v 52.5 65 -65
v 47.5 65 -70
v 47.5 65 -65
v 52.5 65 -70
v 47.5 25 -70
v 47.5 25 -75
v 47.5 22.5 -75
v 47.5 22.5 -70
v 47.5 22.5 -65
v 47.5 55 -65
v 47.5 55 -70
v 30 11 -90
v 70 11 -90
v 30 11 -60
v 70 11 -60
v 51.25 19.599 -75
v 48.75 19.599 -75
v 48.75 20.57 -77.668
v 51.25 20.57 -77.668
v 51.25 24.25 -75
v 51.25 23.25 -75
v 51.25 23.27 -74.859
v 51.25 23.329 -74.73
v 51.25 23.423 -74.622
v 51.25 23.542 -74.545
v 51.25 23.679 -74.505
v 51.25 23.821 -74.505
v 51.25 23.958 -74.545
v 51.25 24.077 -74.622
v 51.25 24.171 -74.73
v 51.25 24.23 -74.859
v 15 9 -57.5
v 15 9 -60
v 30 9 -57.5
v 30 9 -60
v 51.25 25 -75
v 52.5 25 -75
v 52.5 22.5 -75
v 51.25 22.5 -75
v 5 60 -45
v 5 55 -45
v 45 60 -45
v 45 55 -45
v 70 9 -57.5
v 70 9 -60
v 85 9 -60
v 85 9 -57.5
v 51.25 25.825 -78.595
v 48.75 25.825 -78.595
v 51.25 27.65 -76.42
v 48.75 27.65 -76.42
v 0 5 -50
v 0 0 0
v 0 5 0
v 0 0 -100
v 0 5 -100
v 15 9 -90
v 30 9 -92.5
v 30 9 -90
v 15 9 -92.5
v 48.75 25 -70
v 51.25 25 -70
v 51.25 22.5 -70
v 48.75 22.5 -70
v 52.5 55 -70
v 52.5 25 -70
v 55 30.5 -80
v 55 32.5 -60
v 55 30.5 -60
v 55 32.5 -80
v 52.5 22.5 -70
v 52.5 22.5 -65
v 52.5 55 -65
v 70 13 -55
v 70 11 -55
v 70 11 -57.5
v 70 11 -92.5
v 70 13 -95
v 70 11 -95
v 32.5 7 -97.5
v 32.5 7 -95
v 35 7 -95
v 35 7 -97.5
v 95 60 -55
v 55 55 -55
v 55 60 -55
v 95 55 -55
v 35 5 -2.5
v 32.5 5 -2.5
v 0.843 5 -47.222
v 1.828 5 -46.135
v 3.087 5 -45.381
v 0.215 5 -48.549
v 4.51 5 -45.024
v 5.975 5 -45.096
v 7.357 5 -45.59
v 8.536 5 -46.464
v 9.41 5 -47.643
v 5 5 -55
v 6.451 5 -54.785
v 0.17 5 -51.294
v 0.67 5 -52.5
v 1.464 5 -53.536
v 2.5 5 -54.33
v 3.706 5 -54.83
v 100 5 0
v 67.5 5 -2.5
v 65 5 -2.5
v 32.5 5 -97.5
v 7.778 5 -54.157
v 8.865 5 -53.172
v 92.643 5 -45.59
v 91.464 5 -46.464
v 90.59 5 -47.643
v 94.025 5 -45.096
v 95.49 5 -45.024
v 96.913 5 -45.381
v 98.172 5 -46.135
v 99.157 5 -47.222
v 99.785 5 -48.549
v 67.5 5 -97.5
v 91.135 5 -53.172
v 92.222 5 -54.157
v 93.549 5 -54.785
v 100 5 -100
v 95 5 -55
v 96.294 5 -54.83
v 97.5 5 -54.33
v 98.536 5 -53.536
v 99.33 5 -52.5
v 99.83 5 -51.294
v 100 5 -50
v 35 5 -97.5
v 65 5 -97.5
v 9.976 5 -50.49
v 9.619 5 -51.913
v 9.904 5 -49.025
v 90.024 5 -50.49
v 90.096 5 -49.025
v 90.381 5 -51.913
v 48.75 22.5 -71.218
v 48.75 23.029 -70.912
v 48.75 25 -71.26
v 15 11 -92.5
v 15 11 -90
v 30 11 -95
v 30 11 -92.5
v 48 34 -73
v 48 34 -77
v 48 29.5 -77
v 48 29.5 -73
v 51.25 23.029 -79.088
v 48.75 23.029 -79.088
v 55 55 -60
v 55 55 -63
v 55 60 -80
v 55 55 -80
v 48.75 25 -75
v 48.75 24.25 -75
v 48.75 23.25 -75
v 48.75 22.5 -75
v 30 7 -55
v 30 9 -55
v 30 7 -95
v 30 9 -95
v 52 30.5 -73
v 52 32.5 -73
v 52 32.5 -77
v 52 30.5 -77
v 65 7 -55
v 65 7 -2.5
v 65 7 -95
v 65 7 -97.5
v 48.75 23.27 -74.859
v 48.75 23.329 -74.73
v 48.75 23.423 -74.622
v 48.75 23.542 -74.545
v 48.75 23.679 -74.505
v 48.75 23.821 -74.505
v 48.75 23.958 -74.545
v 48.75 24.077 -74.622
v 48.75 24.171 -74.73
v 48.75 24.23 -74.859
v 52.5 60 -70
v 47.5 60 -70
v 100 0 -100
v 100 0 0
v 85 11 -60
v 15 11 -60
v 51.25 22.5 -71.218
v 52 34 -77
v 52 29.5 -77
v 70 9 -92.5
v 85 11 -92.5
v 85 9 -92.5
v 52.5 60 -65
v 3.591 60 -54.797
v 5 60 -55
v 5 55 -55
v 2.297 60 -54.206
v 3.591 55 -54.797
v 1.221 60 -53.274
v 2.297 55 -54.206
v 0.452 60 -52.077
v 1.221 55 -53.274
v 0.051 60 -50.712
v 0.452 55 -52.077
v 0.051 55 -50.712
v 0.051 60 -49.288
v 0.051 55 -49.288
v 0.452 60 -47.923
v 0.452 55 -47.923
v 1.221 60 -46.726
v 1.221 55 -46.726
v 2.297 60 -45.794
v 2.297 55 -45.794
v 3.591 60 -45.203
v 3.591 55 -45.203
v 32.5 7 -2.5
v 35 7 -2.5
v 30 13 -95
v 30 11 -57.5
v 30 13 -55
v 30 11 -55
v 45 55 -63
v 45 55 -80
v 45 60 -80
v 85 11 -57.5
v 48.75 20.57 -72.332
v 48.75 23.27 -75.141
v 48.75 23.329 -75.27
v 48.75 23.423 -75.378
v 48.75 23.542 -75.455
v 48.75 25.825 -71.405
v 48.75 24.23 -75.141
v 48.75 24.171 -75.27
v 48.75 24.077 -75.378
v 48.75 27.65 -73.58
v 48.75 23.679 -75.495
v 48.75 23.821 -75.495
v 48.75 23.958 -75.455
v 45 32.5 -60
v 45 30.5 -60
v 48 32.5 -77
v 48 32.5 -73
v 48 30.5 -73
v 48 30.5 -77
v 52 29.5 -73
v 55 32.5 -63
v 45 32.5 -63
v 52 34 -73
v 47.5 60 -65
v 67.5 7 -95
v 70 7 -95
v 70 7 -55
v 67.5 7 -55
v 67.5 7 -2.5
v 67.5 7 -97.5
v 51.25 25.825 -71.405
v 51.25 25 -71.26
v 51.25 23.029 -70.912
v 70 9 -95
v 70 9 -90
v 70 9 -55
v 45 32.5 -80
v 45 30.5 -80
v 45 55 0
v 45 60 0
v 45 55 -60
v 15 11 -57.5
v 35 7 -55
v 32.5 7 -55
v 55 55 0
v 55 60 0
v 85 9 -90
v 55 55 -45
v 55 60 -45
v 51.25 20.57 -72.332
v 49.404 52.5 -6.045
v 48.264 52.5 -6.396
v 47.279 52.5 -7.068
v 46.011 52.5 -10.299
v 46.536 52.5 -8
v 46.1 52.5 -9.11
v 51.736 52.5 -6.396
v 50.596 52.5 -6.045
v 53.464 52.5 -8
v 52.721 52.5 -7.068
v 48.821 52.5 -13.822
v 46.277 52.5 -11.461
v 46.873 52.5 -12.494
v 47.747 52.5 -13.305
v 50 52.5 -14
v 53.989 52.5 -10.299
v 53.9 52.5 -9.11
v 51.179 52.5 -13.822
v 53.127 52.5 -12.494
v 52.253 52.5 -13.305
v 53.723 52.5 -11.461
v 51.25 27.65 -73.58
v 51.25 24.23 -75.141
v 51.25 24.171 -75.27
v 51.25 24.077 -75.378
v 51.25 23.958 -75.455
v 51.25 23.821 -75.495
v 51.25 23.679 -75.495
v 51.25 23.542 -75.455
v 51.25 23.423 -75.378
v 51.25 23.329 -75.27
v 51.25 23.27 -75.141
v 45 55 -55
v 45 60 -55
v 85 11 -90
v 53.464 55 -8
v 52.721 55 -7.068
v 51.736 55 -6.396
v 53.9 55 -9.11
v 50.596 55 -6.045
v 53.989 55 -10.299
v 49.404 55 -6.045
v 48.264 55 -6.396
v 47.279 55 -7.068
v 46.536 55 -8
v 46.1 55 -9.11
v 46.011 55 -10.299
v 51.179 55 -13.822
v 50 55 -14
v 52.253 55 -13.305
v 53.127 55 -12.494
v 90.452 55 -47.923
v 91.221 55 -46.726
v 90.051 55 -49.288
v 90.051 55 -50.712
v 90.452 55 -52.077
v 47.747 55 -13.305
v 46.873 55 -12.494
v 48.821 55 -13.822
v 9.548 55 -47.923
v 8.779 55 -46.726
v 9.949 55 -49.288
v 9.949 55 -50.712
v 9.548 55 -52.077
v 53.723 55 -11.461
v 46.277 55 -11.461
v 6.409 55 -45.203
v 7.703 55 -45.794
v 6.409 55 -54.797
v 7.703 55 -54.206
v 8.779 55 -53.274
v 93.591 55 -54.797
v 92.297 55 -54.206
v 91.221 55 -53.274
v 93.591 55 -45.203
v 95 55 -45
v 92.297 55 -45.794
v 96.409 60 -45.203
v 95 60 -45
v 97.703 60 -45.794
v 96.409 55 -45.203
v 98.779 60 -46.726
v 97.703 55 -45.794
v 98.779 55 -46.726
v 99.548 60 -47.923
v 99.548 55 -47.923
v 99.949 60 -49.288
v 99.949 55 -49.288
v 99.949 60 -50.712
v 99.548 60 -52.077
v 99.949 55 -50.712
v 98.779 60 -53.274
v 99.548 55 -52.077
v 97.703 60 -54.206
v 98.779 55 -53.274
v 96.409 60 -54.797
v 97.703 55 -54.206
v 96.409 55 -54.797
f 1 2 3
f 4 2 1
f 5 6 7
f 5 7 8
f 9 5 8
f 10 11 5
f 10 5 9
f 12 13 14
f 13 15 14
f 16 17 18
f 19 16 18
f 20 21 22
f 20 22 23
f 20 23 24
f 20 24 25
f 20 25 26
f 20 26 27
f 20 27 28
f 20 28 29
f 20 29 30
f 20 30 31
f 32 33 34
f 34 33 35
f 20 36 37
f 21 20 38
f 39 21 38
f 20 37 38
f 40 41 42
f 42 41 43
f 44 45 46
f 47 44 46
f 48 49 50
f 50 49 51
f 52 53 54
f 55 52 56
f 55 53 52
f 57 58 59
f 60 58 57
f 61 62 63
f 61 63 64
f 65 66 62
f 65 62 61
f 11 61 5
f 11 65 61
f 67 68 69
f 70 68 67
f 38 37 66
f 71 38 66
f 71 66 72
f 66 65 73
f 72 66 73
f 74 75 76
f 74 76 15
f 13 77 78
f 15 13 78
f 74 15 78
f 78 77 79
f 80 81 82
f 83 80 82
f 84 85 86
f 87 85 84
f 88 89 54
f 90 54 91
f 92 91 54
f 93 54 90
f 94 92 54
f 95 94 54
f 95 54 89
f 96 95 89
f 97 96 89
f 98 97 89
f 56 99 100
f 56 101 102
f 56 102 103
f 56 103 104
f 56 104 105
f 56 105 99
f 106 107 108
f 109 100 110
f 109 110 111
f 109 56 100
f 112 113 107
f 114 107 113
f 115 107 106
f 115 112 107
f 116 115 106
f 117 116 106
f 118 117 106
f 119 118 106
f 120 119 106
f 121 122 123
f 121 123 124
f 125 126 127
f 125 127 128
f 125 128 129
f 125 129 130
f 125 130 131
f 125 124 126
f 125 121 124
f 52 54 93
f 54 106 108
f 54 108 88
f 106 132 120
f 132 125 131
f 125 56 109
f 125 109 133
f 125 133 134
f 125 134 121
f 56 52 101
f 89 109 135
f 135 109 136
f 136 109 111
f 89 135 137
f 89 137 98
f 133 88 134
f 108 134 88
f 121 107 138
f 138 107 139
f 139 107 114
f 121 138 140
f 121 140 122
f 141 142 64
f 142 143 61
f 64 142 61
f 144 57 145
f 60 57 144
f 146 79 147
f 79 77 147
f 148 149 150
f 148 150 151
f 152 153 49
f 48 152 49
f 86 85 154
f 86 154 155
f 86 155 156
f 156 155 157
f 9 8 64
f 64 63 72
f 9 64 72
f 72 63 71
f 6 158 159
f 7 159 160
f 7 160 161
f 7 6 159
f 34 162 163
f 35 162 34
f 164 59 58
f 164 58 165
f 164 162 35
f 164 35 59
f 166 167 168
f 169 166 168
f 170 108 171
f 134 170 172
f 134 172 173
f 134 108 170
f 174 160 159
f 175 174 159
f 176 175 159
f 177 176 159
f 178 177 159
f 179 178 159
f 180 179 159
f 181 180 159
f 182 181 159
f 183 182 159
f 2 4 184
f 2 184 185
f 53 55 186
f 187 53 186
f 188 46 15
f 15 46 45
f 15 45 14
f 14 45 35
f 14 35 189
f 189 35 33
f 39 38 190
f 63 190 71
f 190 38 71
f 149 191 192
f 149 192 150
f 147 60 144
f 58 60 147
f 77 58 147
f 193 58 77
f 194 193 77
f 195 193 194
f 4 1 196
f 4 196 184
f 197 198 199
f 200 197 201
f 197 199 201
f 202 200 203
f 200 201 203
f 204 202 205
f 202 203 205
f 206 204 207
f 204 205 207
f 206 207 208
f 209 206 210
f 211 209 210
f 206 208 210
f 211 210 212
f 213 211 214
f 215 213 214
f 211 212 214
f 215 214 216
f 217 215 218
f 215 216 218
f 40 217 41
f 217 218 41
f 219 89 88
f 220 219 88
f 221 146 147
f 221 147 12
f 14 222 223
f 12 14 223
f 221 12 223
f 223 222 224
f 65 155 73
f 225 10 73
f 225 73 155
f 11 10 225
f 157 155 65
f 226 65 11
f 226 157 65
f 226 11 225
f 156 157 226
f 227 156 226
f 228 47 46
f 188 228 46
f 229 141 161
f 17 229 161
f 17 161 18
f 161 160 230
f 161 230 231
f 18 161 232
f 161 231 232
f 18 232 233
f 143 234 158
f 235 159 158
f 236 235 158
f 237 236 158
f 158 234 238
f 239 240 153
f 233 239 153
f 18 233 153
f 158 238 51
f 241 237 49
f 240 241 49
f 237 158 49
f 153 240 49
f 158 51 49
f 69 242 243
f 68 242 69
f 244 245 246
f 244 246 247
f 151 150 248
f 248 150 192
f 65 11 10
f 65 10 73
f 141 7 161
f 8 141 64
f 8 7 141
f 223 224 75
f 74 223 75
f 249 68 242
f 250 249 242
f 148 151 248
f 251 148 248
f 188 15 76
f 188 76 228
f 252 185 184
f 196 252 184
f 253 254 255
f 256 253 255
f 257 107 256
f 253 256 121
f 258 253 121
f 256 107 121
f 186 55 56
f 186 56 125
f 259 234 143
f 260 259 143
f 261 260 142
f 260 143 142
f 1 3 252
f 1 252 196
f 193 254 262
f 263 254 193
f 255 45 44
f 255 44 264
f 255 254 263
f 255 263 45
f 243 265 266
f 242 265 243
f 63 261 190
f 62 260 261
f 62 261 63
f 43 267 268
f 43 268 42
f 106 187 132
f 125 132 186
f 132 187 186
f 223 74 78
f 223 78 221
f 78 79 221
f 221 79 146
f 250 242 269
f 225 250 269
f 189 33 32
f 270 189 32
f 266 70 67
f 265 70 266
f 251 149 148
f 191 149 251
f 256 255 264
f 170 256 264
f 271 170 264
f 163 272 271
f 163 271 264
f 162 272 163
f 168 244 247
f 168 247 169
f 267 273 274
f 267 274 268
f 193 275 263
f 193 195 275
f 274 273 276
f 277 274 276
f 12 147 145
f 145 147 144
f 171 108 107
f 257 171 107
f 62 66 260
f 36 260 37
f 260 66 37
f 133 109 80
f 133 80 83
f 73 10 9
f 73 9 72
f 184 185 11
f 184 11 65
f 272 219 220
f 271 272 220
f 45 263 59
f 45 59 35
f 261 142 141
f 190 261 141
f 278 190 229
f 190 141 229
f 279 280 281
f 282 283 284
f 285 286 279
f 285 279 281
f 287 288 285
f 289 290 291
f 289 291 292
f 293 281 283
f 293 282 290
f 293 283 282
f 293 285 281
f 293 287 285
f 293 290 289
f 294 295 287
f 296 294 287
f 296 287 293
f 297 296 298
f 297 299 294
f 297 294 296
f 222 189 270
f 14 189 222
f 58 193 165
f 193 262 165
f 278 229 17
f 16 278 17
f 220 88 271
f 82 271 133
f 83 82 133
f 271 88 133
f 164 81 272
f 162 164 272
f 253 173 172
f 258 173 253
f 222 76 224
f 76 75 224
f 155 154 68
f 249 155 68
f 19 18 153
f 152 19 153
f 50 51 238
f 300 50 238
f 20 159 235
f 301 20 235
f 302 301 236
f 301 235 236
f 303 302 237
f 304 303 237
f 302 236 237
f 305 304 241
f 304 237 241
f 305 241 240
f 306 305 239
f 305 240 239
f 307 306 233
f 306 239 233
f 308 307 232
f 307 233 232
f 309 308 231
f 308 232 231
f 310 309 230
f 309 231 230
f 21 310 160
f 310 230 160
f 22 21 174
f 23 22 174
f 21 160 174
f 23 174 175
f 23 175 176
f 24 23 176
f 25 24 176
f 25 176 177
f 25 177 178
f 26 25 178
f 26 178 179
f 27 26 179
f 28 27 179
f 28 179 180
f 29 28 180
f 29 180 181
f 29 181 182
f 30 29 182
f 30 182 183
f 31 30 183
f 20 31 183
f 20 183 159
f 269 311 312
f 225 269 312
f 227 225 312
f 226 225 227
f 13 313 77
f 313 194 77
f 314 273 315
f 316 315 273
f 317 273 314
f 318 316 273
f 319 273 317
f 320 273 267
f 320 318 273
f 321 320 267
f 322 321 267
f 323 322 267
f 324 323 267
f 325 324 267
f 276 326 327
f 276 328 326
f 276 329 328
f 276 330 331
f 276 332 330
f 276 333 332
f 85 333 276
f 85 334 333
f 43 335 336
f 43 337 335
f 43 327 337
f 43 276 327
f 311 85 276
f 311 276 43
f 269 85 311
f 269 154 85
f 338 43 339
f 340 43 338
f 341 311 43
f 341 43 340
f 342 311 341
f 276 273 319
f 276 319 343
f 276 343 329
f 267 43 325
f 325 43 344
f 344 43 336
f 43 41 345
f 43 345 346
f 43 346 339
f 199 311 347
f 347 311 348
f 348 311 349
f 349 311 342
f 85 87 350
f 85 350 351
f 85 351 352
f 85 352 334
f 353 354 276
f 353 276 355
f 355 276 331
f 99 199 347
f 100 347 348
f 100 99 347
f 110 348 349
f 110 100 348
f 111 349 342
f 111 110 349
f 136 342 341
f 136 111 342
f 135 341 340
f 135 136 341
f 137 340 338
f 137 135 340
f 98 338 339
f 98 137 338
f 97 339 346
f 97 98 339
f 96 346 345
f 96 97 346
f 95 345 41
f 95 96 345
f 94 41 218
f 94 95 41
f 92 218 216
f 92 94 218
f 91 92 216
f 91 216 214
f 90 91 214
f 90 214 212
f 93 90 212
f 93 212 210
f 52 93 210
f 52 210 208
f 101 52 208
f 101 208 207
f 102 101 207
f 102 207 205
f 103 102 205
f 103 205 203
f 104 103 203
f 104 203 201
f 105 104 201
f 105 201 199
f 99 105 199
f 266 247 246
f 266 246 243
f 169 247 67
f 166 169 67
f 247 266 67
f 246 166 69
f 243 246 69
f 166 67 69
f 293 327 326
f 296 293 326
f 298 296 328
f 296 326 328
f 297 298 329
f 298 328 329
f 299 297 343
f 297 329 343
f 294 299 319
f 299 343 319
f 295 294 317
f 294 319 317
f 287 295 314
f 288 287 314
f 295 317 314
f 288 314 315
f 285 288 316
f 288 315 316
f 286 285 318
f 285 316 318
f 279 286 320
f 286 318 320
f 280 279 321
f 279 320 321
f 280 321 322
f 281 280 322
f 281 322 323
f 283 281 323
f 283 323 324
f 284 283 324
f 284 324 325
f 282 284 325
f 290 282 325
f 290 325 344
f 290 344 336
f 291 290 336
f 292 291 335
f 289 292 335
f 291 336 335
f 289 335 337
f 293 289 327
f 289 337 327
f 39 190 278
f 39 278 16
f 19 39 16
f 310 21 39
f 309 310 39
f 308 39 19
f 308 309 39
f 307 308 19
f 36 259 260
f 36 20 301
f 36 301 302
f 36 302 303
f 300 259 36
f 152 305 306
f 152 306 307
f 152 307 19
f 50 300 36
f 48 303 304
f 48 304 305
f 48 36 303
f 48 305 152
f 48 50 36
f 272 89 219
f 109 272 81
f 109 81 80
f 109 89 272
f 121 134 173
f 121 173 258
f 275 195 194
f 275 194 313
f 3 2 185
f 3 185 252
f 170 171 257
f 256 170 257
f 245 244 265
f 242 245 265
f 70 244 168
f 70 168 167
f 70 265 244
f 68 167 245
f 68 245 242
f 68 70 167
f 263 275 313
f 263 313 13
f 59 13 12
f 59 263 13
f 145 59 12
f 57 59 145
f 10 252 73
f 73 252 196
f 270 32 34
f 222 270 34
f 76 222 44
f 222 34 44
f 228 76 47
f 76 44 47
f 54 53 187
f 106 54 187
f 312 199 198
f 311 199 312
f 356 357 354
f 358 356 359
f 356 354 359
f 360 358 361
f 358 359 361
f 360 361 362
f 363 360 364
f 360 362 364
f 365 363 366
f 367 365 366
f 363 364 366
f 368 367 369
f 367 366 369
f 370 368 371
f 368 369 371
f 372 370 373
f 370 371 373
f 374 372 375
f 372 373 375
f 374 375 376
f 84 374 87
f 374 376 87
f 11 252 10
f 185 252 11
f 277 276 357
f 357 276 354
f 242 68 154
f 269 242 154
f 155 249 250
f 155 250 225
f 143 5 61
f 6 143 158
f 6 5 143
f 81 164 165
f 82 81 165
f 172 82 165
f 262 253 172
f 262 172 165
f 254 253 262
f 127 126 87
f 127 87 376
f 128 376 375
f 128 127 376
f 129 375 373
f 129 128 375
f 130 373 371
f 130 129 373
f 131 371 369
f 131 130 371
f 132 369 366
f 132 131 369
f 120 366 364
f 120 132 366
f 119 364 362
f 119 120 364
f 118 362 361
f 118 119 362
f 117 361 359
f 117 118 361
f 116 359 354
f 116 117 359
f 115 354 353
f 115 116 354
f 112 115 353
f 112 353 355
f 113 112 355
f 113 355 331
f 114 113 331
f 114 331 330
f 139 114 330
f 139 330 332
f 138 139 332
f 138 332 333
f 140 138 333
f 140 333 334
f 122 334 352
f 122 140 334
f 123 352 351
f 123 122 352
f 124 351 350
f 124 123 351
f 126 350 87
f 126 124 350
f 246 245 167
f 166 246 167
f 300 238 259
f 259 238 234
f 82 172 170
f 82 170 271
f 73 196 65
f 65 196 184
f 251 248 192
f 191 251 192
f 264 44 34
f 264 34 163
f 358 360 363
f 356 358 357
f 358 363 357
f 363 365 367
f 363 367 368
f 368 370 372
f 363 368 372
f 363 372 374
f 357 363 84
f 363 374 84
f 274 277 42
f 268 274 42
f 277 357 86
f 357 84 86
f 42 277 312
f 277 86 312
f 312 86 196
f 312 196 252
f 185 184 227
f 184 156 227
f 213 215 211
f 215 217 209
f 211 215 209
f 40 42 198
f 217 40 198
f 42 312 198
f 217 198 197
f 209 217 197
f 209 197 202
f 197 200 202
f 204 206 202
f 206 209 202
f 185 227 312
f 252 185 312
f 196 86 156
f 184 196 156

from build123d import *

# Parameters (mm, degrees)
SKETCH3_W            = 100
SKETCH3_H            = 100
BOSS_EXTRUDE1_DEPTH  = 5
SKETCH6_R            = 5
BOSS_EXTRUDE3_DEPTH  = 55
SKETCH9_R            = 5
BOSS_EXTRUDE4_DEPTH  = 55
SKETCH20_W           = 90
SKETCH20_H           = 10
BOSS_EXTRUDE6_DEPTH  = 5
SKETCH21_R           = 5
BOSS_EXTRUDE7_DEPTH  = 5
SKETCH22_R           = 5
BOSS_EXTRUDE8_DEPTH  = 5
SKETCH24_W           = 10
SKETCH24_H           = 80
BOSS_EXTRUDE9_DEPTH  = 5
SKETCH27_R           = 4
BOSS_EXTRUDE11_DEPTH = 2.5
BOSS_EXTRUDE16_DEPTH = 2
SKETCH31_W           = 2.5
SKETCH31_H           = 95
BOSS_EXTRUDE17_DEPTH = 2
SKETCH32_W           = 2.5
SKETCH32_H           = 95
BOSS_EXTRUDE18_DEPTH = 2
BOSS_EXTRUDE19_DEPTH = 2
BOSS_EXTRUDE20_DEPTH = 2
BOSS_EXTRUDE21_DEPTH = 2
BOSS_EXTRUDE23_DEPTH = 42.5
SKETCH33_W           = 5
SKETCH33_H           = 5
CUT_EXTRUDE2_DEPTH   = 5
BOSS_EXTRUDE24_DEPTH = 3
BOSS_EXTRUDE25_DEPTH = 1.25
BOSS_EXTRUDE26_DEPTH = 1.25
BOSS_EXTRUDE28_DEPTH = 2.5
SKETCH37_R           = 0.5
CUT_EXTRUDE3_DEPTH   = 2.5
BOSS_EXTRUDE31_DEPTH = 2
SKETCH38_W           = 4
SKETCH38_H           = 4
CUT_EXTRUDE4_DEPTH   = 2
BOSS_EXTRUDE32_DEPTH = 4.5


with BuildPart() as part:
    # Sketch3 → Boss-Extrude1 (new body)
    with BuildSketch(Plane(origin=(0, 0, 0), x_dir=(1, 0, 0), z_dir=(0, 1, 0))):
        with Locations((50, 50)):
            Rectangle(SKETCH3_W, SKETCH3_H)
    extrude(amount=BOSS_EXTRUDE1_DEPTH)

    # Sketch6 → Boss-Extrude3 (add)
    with BuildSketch(Plane(origin=(0, 0, 0), x_dir=(-1, 0, 0), z_dir=(0, -1, 0))):
        with Locations(Location((-5, 50, 0), (0, 0, 90))):
            Circle(SKETCH6_R)
    extrude(amount=-BOSS_EXTRUDE3_DEPTH)

    # Sketch9 → Boss-Extrude4 (add)
    with BuildSketch(Plane(origin=(0, 0, 0), x_dir=(-1, 0, 0), z_dir=(0, -1, 0))):
        with Locations(Location((-95, 50, 0), (0, 0, 90))):
            Circle(SKETCH9_R)
    extrude(amount=-BOSS_EXTRUDE4_DEPTH)

    # Sketch20 → Boss-Extrude6 (add)
    with BuildSketch(Plane(origin=(0, 55, 0), x_dir=(1, 0, 0), z_dir=(0, 1, 0))):
        with Locations((50, 50)):
            Rectangle(SKETCH20_W, SKETCH20_H)
    extrude(amount=BOSS_EXTRUDE6_DEPTH)

    # Sketch21 → Boss-Extrude7 (add)
    with BuildSketch(Plane(origin=(0, 55, 0), x_dir=(1, 0, 0), z_dir=(0, 1, 0))):
        with Locations(Location((5, 50, 0), (0, 0, 90))):
            Circle(SKETCH21_R)
    extrude(amount=BOSS_EXTRUDE7_DEPTH)

    # Sketch22 → Boss-Extrude8 (add)
    with BuildSketch(Plane(origin=(0, 55, 0), x_dir=(1, 0, 0), z_dir=(0, 1, 0))):
        with Locations(Location((95, 50, 0), (0, 0, 90))):
            Circle(SKETCH22_R)
    extrude(amount=BOSS_EXTRUDE8_DEPTH)

    # Sketch24 → Boss-Extrude9 (add)
    with BuildSketch(Plane(origin=(0, 55, 0), x_dir=(-1, 0, 0), z_dir=(0, -1, 0))):
        with Locations((-50, 40)):
            Rectangle(SKETCH24_W, SKETCH24_H)
    extrude(amount=-BOSS_EXTRUDE9_DEPTH)

    # Sketch27 → Boss-Extrude11 (add)
    with BuildSketch(Plane(origin=(0, 55, 0), x_dir=(-1, 0, 0), z_dir=(0, -1, 0))):
        with Locations(Location((-50, 10, 0), (0, 0, 90))):
            Circle(SKETCH27_R)
    extrude(amount=BOSS_EXTRUDE11_DEPTH)



with BuildPart() as body_2:
    # 3DSketch5 → Boss-Extrude16 (new body)
    with BuildSketch(Plane(origin=(30, 7, -55), x_dir=(0.7071067811865476, 0, -0.7071067811865475), z_dir=(0, 1, 0))):
        Polygon((0, 0), (28.284271247, 28.284271247), (56.568542495, 0), (28.284271247, -28.284271247), align=None)
    extrude(amount=BOSS_EXTRUDE16_DEPTH)


with BuildPart() as part_1:
    add(part.part)

    add(body_2.part)  # Boss-Extrude17 merges body 2
    # Sketch31 → Boss-Extrude17 (add)
    with BuildSketch(Plane(origin=(0, 5, 0), x_dir=(1, 0, 0), z_dir=(0, 1, 0))):
        with Locations((33.75, 50)):
            Rectangle(SKETCH31_W, SKETCH31_H)
    extrude(amount=BOSS_EXTRUDE17_DEPTH)

    # Sketch32 → Boss-Extrude18 (add)
    with BuildSketch(Plane(origin=(0, 5, 0), x_dir=(1, 0, 0), z_dir=(0, 1, 0))):
        with Locations((66.25, 50)):
            Rectangle(SKETCH32_W, SKETCH32_H)
    extrude(amount=BOSS_EXTRUDE18_DEPTH)

    # 3DSketch6 → Boss-Extrude19 (add)
    with BuildSketch(Plane(origin=(15, 9, -90), x_dir=(0.9993628543475496, 0, -0.035691530512412514), z_dir=(0, 1, 0))):
        Polygon((0, 0), (0.089228826, 2.498407136), (70.044628631, 0), (69.955399804, -2.498407136), align=None)
    extrude(amount=BOSS_EXTRUDE19_DEPTH)

    # 3DSketch7 → Boss-Extrude20 (add)
    with BuildSketch(Plane(origin=(15, 9, -60), x_dir=(0.9993628543475496, 0, 0.035691530512412514), z_dir=(0, 1, 0))):
        Polygon((0, 0), (0.089228826, -2.498407136), (70.044628631, 0), (69.955399804, 2.498407136), align=None)
    extrude(amount=BOSS_EXTRUDE20_DEPTH)

    # 3DSketch10 → Boss-Extrude21 (add)
    with BuildSketch(Plane(origin=(30, 11, -95), x_dir=(0.7071067811865476, 0, 0.7071067811865475), z_dir=(0, -1, 0))):
        Polygon((0, 0), (28.284271247, 28.284271247), (56.568542495, 0), (28.284271247, -28.284271247), align=None)
    extrude(amount=-BOSS_EXTRUDE21_DEPTH)

    # 3DSketch15 → Boss-Extrude23 (add)
    with BuildSketch(Plane(origin=(52.5, 65, -65), x_dir=(-0.707106781186547, 0, -0.707106781186548), z_dir=(0, -1, 0))):
        Polygon((0, 0), (3.535533906, 3.535533906), (7.071067812, 0), (3.535533906, -3.535533906), align=None)
    extrude(amount=BOSS_EXTRUDE23_DEPTH)

    # Sketch33 → Cut-Extrude2 (cut)
    with BuildSketch(Plane(origin=(0, 60, 0), x_dir=(1, 0, 0), z_dir=(0, 1, 0))):
        with Locations((50, 67.5)):
            Rectangle(SKETCH33_W, SKETCH33_H)
    extrude(amount=-CUT_EXTRUDE2_DEPTH, mode=Mode.SUBTRACT)


with BuildPart() as cut_extrude2_piece_1:
    # of the separate pieces the step leaves, piece 1, a body of its own (cut_extrude2_pieces)
    add(part_1.part.solids().sort_by_distance((0, 0, 0))[0])

    # 3DSketch16 → Boss-Extrude24 (add)
    with BuildSketch(Plane(origin=(45, 55, -60), x_dir=(0.4061384660534477, -0.9138115486202572, 0), z_dir=(0, 0, 1))):
        Polygon((0, 0), (4.061384661, 9.138115486), (24.622144504, 0), (20.560759844, -9.138115486), align=None)
    extrude(amount=-BOSS_EXTRUDE24_DEPTH)


with BuildPart() as cut_extrude2_piece_2:
    # of the separate pieces the step leaves, piece 2, a body of its own (cut_extrude2_pieces)
    add(part_1.part.solids().sort_by_distance((52.5, 22.5, -70))[0])

    # 3DSketch17 → Boss-Extrude25 (add)
    with BuildSketch(Plane(origin=(52.5, 22.5, -70), x_dir=(0, 0.4472135954999585, -0.8944271909999156), z_dir=(1, 0, 0))):
        Polygon((0, 0), (1.118033989, 2.236067977), (5.590169944, 0), (4.472135955, -2.236067977), align=None)
    extrude(amount=-BOSS_EXTRUDE25_DEPTH)



with BuildPart() as cut_extrude2_piece_3:
    # of the separate pieces the step leaves, piece 3, a body of its own (cut_extrude2_pieces)
    add(part_1.part.solids().sort_by_distance((52.5, 65, -65))[0])


with BuildPart() as body_4:
    # 3DSketch18 → Boss-Extrude26 (new body)
    with BuildSketch(Plane(origin=(47.5, 22.5, -70), x_dir=(0, 0.4472135954999585, -0.8944271909999156), z_dir=(1, 0, 0))):
        Polygon((0, 0), (1.118033989, 2.236067977), (5.590169944, 0), (4.472135955, -2.236067977), align=None)
    extrude(amount=BOSS_EXTRUDE26_DEPTH)


with BuildPart() as cut_extrude2_piece_2_1:
    add(cut_extrude2_piece_2.part)

    add(body_4.part)  # Boss-Extrude28 merges body 4
    # Sketch36 → Boss-Extrude28 (add)
    with BuildSketch(Plane(origin=(48.75, 0, 0), x_dir=(0, 0, -1), z_dir=(1, 0, 0))):
        Polygon((76.419636818, 27.6504201), (73.580363182, 27.6504201), (71.405353392, 25.825370187), (70.912318699, 23.029231498), (72.331955517, 20.570348402), (75, 19.599259626), (77.668044483, 20.570348402), (79.087681301, 23.029231498), (78.594646608, 25.825370187), align=None)
    extrude(amount=BOSS_EXTRUDE28_DEPTH)

    # Sketch37 → Cut-Extrude3 (cut)
    with BuildSketch(Plane.ZY.offset(-48.75)):
        with Locations(Location((-75, 23.75, 0), (0, 0, 90))):
            Circle(SKETCH37_R)
    extrude(amount=-CUT_EXTRUDE3_DEPTH, mode=Mode.SUBTRACT)


with BuildPart() as body_4_2:
    # 3DSketch28 → Boss-Extrude31 (new body)
    with BuildSketch(Plane(origin=(55, 32.5, -60), x_dir=(-0.447213595499958, 0, -0.894427190999916), z_dir=(0, -1, 0))):
        Polygon((0, 0), (17.88854382, 8.94427191), (22.360679775, 0), (4.472135955, -8.94427191), align=None)
    extrude(amount=BOSS_EXTRUDE31_DEPTH)

    # Sketch38 → Cut-Extrude4 (cut)
    with BuildSketch(Plane(origin=(0, 32.5, 0), x_dir=(1, 0, 0), z_dir=(0, 1, 0))):
        with Locations((50, 75)):
            Rectangle(SKETCH38_W, SKETCH38_H)
    extrude(amount=-CUT_EXTRUDE4_DEPTH, mode=Mode.SUBTRACT)


with BuildPart() as body_5:
    # 3DSketch30 → Boss-Extrude32 (new body)
    with BuildSketch(Plane(origin=(52, 34, -73), x_dir=(-0.7071067811865469, 0, -0.7071067811865481), z_dir=(0, -1, 0))):
        Polygon((0, 0), (2.828427125, 2.828427125), (5.656854249, 0), (2.828427125, -2.828427125), align=None)
    extrude(amount=BOSS_EXTRUDE32_DEPTH)


solid = Compound([cut_extrude2_piece_1.part, cut_extrude2_piece_3.part, cut_extrude2_piece_2_1.part, body_4_2.part, body_5.part])
